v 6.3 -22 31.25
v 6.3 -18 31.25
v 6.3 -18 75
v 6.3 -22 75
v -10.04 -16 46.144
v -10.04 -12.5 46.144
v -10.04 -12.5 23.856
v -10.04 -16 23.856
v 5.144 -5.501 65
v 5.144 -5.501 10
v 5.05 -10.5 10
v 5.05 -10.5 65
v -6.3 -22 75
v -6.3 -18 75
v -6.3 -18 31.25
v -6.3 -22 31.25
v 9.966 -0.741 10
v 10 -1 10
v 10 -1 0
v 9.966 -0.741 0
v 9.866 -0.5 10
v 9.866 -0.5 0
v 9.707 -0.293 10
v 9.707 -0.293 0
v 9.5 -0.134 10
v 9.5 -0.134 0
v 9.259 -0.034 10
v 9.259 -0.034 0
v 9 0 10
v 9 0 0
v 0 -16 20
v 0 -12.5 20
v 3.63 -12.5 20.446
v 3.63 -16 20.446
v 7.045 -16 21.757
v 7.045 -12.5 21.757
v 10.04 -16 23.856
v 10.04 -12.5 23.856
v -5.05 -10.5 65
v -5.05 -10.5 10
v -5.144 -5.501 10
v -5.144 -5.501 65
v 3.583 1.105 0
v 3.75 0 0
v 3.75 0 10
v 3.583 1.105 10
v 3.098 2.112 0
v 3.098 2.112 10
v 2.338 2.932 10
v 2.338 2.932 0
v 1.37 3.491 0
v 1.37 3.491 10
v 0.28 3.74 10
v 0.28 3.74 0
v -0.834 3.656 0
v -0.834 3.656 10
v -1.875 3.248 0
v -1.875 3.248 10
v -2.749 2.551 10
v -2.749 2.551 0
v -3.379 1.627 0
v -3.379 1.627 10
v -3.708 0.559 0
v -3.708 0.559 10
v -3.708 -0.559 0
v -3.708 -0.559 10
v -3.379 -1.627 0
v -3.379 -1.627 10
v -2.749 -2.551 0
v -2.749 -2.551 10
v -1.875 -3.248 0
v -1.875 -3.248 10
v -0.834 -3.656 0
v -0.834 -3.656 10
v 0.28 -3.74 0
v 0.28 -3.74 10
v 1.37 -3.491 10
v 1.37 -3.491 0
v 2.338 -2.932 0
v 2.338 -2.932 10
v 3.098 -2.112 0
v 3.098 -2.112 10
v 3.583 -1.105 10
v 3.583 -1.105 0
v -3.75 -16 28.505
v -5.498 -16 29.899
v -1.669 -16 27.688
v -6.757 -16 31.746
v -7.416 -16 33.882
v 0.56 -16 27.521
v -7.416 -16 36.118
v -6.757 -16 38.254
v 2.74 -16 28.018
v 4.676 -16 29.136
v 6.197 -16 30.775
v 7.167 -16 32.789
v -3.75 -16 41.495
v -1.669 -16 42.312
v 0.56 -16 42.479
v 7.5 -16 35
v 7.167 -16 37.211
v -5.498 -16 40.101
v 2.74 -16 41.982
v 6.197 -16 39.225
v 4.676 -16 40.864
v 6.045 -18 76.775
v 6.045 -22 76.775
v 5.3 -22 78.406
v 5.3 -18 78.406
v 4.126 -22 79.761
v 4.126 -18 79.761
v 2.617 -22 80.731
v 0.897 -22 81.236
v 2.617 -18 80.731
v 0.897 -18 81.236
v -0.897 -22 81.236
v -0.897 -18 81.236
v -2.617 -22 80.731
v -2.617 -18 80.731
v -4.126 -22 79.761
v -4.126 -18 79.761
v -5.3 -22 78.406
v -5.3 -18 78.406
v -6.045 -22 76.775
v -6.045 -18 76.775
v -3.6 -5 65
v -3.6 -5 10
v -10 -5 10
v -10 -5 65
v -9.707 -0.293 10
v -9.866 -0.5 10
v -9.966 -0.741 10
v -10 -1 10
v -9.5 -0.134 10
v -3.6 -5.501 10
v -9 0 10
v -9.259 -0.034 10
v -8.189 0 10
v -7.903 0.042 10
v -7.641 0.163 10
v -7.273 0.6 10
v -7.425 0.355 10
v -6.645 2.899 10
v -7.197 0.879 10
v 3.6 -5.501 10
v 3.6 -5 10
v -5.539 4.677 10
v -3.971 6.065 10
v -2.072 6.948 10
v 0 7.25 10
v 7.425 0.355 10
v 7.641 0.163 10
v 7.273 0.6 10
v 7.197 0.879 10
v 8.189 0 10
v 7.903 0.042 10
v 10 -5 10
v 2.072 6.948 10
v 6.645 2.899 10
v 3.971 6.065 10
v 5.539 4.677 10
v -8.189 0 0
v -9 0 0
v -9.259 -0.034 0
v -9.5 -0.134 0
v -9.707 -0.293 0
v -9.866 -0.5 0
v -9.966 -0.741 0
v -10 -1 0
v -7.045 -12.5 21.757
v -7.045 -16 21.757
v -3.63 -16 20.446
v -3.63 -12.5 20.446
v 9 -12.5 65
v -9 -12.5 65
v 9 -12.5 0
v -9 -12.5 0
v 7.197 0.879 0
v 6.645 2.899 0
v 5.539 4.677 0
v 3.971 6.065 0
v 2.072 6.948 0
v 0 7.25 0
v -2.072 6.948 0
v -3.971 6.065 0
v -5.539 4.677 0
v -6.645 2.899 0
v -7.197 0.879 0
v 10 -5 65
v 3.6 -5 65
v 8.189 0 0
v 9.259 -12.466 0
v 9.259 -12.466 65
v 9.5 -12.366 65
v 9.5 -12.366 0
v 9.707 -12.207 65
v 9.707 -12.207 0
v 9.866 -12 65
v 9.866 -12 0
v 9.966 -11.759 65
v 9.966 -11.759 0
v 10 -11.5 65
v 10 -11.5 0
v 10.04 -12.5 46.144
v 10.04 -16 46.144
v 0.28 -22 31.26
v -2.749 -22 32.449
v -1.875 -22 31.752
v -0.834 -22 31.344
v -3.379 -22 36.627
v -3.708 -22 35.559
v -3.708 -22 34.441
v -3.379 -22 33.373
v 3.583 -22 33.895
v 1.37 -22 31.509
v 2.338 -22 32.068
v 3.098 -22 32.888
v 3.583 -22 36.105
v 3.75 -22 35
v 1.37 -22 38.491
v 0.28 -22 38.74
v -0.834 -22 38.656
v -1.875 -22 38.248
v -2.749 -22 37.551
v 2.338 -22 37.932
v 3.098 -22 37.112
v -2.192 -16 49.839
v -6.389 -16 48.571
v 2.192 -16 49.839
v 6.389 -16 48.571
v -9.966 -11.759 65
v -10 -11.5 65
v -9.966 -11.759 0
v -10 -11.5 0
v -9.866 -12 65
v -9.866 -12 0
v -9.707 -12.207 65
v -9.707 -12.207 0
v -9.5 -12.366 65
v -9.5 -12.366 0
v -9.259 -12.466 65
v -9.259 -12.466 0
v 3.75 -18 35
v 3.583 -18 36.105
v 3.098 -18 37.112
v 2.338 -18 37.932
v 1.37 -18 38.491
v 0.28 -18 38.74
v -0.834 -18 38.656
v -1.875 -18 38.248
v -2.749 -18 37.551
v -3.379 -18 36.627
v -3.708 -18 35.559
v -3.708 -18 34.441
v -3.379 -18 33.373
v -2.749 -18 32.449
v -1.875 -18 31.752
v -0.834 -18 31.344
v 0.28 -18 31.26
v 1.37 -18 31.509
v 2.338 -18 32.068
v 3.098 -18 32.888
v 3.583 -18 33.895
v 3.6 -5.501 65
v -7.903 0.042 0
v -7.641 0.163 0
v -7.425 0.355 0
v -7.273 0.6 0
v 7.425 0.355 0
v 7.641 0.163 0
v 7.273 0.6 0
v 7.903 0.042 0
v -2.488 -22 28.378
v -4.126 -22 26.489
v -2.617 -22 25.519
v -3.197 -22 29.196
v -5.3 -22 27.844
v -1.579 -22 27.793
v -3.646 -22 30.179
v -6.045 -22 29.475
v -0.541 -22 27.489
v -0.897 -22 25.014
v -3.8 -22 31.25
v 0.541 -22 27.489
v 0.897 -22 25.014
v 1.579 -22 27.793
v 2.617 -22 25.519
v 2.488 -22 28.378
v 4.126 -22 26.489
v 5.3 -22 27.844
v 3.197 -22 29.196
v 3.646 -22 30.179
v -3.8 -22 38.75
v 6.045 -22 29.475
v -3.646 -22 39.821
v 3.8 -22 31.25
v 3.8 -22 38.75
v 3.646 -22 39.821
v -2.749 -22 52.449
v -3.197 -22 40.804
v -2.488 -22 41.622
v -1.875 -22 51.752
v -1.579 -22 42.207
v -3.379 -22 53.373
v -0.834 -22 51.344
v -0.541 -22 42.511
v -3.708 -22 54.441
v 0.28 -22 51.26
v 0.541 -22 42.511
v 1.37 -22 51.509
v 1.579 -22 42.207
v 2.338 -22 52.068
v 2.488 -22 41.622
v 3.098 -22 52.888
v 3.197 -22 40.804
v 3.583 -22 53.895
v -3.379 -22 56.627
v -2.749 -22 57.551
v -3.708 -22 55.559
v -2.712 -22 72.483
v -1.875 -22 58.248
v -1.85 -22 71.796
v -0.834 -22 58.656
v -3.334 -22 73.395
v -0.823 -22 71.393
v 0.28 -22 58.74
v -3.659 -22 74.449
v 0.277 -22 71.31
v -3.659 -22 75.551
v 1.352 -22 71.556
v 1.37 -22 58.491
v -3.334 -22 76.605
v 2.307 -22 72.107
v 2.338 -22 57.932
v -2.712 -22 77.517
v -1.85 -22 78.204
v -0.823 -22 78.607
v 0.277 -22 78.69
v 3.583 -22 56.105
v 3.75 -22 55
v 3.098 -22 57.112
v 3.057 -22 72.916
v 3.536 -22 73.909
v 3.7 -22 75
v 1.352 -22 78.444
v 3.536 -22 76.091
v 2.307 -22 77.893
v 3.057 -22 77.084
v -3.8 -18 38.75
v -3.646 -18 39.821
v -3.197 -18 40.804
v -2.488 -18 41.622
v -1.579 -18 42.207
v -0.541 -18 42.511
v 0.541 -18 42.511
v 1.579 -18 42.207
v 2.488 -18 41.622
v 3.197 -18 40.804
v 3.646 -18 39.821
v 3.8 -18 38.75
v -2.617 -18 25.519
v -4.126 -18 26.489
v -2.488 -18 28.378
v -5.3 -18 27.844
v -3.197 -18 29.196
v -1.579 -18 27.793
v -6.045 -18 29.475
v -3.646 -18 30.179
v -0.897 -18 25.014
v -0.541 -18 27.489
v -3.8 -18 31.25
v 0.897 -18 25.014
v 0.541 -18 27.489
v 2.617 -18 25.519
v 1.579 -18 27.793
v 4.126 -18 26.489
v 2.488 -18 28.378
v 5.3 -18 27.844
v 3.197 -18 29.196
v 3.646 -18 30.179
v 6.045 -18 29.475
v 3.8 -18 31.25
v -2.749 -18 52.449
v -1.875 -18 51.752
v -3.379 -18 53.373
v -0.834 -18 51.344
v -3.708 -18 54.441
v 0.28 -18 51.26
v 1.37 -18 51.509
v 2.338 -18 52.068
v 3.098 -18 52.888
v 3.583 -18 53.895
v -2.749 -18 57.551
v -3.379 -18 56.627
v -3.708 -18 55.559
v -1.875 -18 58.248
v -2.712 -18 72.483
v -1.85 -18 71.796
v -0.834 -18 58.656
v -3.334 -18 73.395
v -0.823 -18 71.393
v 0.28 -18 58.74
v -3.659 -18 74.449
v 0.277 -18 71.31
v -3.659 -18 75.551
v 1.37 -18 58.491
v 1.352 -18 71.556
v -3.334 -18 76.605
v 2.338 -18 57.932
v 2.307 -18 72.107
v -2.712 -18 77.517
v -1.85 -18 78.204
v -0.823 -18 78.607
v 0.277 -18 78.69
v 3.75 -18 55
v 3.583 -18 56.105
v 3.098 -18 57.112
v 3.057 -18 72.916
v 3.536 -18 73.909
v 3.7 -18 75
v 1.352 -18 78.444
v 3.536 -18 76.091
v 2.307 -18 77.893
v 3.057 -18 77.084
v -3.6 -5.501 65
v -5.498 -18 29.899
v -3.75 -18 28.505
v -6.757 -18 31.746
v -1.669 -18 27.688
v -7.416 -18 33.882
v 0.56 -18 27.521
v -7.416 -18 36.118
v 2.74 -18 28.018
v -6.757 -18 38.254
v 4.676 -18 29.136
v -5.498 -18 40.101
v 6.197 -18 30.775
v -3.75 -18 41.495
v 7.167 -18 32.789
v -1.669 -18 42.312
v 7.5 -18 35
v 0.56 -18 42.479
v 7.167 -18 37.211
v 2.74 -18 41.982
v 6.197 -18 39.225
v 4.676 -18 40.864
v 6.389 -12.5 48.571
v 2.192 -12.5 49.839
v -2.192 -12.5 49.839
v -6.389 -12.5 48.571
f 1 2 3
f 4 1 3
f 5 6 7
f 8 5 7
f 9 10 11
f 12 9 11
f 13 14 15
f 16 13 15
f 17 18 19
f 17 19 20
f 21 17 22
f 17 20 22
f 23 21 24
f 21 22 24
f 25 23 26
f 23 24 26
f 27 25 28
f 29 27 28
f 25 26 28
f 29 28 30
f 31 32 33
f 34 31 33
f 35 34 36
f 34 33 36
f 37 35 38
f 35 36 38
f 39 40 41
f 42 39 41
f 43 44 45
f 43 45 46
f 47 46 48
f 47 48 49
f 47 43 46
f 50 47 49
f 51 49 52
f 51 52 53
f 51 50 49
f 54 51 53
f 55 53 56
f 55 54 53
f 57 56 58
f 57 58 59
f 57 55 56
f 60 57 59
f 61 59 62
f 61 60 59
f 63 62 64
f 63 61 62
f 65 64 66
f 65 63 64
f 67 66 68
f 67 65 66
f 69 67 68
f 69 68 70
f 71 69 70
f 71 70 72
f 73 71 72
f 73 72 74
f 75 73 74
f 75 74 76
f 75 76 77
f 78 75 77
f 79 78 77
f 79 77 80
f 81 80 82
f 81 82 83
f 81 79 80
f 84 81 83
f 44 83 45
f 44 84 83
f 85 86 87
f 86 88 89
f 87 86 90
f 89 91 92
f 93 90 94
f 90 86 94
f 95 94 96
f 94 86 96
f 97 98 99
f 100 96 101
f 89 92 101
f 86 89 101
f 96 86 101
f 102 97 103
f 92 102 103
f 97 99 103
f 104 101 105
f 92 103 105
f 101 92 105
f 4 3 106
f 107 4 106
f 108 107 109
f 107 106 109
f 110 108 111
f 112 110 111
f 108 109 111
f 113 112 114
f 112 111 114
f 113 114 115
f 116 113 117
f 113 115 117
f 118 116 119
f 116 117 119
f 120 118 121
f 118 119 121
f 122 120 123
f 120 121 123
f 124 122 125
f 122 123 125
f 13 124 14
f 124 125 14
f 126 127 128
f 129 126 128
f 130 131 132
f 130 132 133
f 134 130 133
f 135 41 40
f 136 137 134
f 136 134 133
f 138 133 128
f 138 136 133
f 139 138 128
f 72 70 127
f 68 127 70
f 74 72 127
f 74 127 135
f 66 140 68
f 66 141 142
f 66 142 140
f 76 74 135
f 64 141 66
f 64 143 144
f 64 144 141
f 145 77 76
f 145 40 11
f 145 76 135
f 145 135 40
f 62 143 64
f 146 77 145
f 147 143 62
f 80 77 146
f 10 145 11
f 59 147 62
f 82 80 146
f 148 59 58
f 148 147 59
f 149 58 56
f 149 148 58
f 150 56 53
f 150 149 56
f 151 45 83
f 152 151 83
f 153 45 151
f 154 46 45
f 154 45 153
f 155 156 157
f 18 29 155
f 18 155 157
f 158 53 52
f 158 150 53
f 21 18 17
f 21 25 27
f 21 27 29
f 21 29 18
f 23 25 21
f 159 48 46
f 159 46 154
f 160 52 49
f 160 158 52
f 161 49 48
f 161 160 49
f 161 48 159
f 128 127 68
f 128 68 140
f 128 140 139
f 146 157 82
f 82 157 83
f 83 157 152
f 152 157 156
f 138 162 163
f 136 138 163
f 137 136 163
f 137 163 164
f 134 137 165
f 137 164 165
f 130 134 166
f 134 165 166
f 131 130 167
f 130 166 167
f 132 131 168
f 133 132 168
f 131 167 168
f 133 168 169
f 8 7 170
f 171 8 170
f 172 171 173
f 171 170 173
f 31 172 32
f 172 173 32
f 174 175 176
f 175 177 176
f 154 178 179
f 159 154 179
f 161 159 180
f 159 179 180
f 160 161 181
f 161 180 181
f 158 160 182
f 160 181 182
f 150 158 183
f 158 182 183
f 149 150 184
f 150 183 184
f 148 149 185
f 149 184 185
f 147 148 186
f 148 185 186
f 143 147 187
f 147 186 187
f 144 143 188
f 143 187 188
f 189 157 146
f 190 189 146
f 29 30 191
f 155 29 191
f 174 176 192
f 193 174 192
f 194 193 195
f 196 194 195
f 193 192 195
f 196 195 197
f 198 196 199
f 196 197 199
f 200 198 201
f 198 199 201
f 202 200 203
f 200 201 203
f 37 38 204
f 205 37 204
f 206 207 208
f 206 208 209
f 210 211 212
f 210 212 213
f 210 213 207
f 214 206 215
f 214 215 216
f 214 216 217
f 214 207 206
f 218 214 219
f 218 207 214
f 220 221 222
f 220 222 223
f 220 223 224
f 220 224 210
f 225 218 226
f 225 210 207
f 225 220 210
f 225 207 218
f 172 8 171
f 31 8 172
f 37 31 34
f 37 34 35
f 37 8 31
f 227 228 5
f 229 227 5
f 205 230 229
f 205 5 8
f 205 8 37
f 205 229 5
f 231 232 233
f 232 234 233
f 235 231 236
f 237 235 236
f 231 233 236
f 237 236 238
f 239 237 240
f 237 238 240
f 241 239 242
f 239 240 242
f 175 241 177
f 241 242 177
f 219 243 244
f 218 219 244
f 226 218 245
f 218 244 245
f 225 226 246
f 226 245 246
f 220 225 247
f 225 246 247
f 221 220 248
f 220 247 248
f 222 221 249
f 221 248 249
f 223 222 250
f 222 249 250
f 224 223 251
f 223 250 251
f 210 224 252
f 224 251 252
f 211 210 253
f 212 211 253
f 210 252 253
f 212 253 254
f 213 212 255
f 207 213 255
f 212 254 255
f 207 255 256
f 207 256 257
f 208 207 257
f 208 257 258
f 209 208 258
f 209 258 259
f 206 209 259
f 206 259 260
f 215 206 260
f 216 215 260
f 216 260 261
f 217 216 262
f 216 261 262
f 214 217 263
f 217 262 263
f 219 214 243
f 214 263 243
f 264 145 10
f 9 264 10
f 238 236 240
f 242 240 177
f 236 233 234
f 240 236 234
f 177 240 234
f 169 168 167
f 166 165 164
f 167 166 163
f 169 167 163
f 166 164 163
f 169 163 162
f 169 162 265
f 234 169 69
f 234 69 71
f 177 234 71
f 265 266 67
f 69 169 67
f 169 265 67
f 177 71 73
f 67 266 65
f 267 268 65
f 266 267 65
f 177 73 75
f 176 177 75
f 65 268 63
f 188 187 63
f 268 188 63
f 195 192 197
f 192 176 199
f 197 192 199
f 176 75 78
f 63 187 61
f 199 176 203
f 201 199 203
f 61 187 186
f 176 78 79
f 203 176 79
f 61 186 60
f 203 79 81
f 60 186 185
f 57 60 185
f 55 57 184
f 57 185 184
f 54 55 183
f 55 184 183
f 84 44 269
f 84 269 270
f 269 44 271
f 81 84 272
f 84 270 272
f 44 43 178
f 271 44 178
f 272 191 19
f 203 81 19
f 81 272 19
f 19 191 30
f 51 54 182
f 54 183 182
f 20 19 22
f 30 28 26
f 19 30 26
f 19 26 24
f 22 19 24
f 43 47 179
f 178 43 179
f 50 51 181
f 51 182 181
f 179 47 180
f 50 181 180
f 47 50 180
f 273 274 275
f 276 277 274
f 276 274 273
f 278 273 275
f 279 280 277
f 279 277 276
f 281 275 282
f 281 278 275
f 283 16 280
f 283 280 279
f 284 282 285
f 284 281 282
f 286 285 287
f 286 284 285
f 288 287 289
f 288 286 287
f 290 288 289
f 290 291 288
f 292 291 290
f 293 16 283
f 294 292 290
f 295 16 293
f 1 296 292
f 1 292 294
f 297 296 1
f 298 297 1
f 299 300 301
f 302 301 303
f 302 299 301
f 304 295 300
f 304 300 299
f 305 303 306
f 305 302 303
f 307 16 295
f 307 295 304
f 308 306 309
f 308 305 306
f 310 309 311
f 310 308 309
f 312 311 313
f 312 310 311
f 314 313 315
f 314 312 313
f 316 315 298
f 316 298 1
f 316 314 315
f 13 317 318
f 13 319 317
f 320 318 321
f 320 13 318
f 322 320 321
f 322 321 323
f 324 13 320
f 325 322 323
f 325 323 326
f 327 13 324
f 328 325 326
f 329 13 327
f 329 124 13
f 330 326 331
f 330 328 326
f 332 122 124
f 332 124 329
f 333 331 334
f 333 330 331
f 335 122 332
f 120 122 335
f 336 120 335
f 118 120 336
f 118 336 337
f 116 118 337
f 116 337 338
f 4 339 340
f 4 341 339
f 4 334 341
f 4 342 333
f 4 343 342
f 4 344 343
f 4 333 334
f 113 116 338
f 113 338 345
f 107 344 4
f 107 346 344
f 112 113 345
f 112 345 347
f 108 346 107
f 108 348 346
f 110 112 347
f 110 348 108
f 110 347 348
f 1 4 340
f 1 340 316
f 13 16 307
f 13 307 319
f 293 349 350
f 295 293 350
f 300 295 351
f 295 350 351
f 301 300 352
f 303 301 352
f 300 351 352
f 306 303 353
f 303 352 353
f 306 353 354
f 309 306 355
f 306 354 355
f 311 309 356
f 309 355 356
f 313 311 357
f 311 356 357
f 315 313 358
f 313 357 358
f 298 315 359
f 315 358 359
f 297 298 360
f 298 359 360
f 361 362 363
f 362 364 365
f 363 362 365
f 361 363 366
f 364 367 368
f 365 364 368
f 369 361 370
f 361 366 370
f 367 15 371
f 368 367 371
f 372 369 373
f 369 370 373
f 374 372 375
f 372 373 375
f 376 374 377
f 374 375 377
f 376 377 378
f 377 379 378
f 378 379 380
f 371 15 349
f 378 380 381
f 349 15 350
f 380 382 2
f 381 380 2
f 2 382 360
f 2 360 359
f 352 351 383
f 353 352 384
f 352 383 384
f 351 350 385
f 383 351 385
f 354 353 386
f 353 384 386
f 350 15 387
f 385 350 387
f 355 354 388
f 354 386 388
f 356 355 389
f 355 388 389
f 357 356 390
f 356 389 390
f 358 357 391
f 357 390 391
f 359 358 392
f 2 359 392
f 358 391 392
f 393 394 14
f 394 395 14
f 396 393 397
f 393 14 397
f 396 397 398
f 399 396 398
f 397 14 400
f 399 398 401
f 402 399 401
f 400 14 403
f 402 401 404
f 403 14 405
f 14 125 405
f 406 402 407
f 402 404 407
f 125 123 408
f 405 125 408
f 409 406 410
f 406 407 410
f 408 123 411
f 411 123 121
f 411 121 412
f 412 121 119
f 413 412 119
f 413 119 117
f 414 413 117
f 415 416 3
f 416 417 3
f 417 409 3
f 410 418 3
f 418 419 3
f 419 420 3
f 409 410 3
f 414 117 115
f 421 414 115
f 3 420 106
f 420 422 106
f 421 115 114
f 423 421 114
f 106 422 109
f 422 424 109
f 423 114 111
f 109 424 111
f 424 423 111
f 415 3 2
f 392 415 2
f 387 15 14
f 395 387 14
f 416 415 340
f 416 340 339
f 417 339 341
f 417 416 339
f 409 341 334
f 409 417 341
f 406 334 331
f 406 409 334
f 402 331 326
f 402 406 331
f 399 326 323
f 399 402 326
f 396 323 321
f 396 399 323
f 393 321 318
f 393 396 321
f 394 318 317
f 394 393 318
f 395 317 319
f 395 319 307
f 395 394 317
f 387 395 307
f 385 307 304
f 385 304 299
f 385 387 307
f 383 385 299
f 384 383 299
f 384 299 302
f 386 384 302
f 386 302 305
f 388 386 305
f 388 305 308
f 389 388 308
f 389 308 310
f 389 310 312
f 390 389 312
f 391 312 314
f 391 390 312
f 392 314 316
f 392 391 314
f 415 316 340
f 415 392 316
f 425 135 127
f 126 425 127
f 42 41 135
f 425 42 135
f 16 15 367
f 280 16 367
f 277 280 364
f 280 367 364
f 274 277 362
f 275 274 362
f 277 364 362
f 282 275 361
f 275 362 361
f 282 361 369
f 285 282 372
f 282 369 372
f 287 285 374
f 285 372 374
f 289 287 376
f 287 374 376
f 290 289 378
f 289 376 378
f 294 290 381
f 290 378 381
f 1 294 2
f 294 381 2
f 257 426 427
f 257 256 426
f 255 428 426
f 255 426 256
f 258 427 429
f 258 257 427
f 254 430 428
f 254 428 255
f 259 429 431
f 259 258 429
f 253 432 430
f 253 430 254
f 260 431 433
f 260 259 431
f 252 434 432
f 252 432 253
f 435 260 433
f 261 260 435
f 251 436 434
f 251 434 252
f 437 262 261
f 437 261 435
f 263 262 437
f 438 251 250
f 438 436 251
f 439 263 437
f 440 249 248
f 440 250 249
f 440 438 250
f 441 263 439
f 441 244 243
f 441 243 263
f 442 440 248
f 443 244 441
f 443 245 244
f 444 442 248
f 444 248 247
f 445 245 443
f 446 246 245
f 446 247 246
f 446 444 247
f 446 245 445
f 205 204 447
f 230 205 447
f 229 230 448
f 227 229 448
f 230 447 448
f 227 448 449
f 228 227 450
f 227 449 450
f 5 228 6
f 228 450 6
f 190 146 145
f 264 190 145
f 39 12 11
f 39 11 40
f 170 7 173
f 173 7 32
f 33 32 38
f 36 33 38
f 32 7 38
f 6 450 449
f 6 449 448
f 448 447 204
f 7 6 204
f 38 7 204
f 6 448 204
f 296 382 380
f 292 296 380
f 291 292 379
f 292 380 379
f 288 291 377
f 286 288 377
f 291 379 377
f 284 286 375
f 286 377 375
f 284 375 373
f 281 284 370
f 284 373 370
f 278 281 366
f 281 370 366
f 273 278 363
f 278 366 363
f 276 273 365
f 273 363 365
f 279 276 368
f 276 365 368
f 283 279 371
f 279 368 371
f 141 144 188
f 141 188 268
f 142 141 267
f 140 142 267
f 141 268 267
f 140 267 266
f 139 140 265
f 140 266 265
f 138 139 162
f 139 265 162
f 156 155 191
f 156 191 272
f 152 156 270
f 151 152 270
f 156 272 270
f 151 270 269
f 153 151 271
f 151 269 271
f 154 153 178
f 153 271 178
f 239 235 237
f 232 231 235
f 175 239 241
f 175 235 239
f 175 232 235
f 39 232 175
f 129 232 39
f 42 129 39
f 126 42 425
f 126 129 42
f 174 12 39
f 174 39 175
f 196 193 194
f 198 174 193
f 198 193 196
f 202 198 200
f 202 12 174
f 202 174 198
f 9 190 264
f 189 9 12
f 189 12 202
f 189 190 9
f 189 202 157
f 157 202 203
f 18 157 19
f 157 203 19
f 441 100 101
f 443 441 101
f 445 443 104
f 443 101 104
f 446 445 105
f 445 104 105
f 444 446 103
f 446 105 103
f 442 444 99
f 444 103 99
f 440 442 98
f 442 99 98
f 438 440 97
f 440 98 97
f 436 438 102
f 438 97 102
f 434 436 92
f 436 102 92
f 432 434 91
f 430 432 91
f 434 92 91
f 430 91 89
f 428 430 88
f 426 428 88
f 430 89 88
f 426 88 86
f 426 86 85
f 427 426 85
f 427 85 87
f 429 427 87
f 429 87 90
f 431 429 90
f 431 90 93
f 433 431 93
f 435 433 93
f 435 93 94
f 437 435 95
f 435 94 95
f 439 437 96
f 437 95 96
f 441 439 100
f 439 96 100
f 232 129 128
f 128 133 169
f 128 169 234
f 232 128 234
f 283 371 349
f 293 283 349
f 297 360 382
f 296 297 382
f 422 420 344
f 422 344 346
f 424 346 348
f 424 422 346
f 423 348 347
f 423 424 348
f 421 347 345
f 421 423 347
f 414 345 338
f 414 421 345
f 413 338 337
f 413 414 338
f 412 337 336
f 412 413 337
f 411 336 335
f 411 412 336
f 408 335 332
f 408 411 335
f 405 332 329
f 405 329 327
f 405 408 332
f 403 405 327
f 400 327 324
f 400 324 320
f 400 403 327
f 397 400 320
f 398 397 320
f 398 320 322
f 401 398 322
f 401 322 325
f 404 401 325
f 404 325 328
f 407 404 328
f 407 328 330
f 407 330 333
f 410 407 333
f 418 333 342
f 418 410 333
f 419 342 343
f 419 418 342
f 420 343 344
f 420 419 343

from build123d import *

# Parameters (mm, degrees)
F0_R      = 3.75
F1_DEPTH  = 10
F3_DEPTH  = 55
F5_DEPTH  = 3.5
F6_R      = 7.5
F7_DEPTH  = 2
F9_DEPTH  = 4
F8_R      = 3.75
F8_R_2    = 3.7
F10_DEPTH = 4


with BuildPart() as f1:
    # F0 (on Top) → F1 (new body)
    with BuildSketch(Plane.XY):
        with BuildLine():
            ThreePointArc((8.1891696771, 0), (7.5263017118, 0.2512636909), (7.1965430496, 0.8787878788))
            ThreePointArc((7.1965430496, 0.8787878788), (0, 7.25), (-7.1965430496, 0.8787878788))
            ThreePointArc((-7.1965430496, 0.8787878788), (-7.5263017118, 0.2512636909), (-8.1891696771, 0))
            Line((-8.1891696771, 0), (-9, 0))
            ThreePointArc((-9, 0), (-9.7071067812, -0.2928932188), (-10, -1))
            Line((-10, -1), (-10, -11.5))
            ThreePointArc((-10, -11.5), (-9.7071067812, -12.2071067812), (-9, -12.5))
            Line((-9, -12.5), (9, -12.5))
            ThreePointArc((9, -12.5), (9.7071067812, -12.2071067812), (10, -11.5))
            Line((10, -11.5), (10, -1))
            ThreePointArc((10, -1), (9.7071067812, -0.2928932188), (9, 0))
            Line((9, 0), (8.1891696771, 0))
        make_face()
        Circle(F0_R, mode=Mode.SUBTRACT)
    extrude(amount=F1_DEPTH)

    # F2 (on face) → F3 (join)
    with BuildSketch(Plane.XY.offset(10)):
        with BuildLine():
            Line((10, -5), (3.6, -5))
            Line((3.6, -5), (3.6, -5.5008749347))
            Line((3.6, -5.5008749347), (5.1435338545, -5.5008749347))
            Line((5.1435338545, -5.5008749347), (5.05, -10.5))
            Line((5.05, -10.5), (-5.05, -10.5))
            Line((-5.05, -10.5), (-5.1435338545, -5.5008749347))
            Line((-5.1435338545, -5.5008749347), (-3.6, -5.5008749347))
            Line((-3.6, -5.5008749347), (-3.6, -5))
            Line((-3.6, -5), (-10, -5))
            Line((-10, -5), (-10, -11.5))
            ThreePointArc((-10, -11.5), (-9.7071067812, -12.2071067812), (-9, -12.5))
            Line((-9, -12.5), (9, -12.5))
            ThreePointArc((9, -12.5), (9.7071067812, -12.2071067812), (10, -11.5))
            Line((10, -11.5), (10, -5))
        make_face()
    extrude(amount=F3_DEPTH)


with BuildPart() as f5:
    # F4 (on face) → F5 (new body)
    with BuildSketch(Plane.XZ.offset(12.5)):
        with BuildLine():
            Line((10.0404089317, 23.8559348313), (10.0404089317, 46.1440651687))
            ThreePointArc((10.0404089317, 46.1440651687), (0, 50), (-10.0404089317, 46.1440651687))
            Line((-10.0404089317, 46.1440651687), (-10.0404089317, 23.8559348313))
            ThreePointArc((-10.0404089317, 23.8559348313), (-5.3776864203, 20.9971256963), (0, 20))
            ThreePointArc((0, 20), (5.3776864203, 20.9971256963), (10.0404089317, 23.8559348313))
        make_face()
    extrude(amount=F5_DEPTH)


with BuildPart() as f7:
    # F6 (on face) → F7 (new body)
    with BuildSketch(Plane.XZ.offset(16)):
        with Locations((0, 35)):
            Circle(F6_R)
    extrude(amount=F7_DEPTH)

    # F8 (on face) → F9 (join)
    with BuildSketch(Plane.XZ.offset(18)):
        with BuildLine():
            ThreePointArc((-3.75, 35), (0, 31.25), (3.75, 35))
            ThreePointArc((3.75, 35), (0, 38.75), (-3.75, 35))
        make_face()
    extrude(amount=F9_DEPTH)


with BuildPart() as f10:
    # F8 (on face) → F10 (new body)
    with BuildSketch(Plane.XZ.offset(18)):
        with BuildLine():
            Line((-6.3, 55), (-6.3, 31.25))
            ThreePointArc((-6.3, 31.25), (0, 24.95), (6.3, 31.25))
            Line((6.3, 31.25), (6.3, 55))
            Line((6.3, 55), (6.3, 75))
            ThreePointArc((6.3, 75), (0, 81.3), (-6.3, 75))
            Line((-6.3, 75), (-6.3, 55))
        make_face()
        with BuildLine():
            Line((3.8, 38.75), (3.8, 35))
            Line((3.8, 35), (3.8, 31.25))
            ThreePointArc((3.8, 31.25), (0, 27.45), (-3.8, 31.25))
            Line((-3.8, 31.25), (-3.8, 35))
            Line((-3.8, 35), (-3.8, 38.75))
            ThreePointArc((-3.8, 38.75), (0, 42.55), (3.8, 38.75))
        make_face(mode=Mode.SUBTRACT)
        with Locations((0, 55)):
            Circle(F8_R, mode=Mode.SUBTRACT)
        with Locations((0, 75)):
            Circle(F8_R_2, mode=Mode.SUBTRACT)
    extrude(amount=F10_DEPTH)


solid = Compound([f1.part, f5.part, f7.part, f10.part])
